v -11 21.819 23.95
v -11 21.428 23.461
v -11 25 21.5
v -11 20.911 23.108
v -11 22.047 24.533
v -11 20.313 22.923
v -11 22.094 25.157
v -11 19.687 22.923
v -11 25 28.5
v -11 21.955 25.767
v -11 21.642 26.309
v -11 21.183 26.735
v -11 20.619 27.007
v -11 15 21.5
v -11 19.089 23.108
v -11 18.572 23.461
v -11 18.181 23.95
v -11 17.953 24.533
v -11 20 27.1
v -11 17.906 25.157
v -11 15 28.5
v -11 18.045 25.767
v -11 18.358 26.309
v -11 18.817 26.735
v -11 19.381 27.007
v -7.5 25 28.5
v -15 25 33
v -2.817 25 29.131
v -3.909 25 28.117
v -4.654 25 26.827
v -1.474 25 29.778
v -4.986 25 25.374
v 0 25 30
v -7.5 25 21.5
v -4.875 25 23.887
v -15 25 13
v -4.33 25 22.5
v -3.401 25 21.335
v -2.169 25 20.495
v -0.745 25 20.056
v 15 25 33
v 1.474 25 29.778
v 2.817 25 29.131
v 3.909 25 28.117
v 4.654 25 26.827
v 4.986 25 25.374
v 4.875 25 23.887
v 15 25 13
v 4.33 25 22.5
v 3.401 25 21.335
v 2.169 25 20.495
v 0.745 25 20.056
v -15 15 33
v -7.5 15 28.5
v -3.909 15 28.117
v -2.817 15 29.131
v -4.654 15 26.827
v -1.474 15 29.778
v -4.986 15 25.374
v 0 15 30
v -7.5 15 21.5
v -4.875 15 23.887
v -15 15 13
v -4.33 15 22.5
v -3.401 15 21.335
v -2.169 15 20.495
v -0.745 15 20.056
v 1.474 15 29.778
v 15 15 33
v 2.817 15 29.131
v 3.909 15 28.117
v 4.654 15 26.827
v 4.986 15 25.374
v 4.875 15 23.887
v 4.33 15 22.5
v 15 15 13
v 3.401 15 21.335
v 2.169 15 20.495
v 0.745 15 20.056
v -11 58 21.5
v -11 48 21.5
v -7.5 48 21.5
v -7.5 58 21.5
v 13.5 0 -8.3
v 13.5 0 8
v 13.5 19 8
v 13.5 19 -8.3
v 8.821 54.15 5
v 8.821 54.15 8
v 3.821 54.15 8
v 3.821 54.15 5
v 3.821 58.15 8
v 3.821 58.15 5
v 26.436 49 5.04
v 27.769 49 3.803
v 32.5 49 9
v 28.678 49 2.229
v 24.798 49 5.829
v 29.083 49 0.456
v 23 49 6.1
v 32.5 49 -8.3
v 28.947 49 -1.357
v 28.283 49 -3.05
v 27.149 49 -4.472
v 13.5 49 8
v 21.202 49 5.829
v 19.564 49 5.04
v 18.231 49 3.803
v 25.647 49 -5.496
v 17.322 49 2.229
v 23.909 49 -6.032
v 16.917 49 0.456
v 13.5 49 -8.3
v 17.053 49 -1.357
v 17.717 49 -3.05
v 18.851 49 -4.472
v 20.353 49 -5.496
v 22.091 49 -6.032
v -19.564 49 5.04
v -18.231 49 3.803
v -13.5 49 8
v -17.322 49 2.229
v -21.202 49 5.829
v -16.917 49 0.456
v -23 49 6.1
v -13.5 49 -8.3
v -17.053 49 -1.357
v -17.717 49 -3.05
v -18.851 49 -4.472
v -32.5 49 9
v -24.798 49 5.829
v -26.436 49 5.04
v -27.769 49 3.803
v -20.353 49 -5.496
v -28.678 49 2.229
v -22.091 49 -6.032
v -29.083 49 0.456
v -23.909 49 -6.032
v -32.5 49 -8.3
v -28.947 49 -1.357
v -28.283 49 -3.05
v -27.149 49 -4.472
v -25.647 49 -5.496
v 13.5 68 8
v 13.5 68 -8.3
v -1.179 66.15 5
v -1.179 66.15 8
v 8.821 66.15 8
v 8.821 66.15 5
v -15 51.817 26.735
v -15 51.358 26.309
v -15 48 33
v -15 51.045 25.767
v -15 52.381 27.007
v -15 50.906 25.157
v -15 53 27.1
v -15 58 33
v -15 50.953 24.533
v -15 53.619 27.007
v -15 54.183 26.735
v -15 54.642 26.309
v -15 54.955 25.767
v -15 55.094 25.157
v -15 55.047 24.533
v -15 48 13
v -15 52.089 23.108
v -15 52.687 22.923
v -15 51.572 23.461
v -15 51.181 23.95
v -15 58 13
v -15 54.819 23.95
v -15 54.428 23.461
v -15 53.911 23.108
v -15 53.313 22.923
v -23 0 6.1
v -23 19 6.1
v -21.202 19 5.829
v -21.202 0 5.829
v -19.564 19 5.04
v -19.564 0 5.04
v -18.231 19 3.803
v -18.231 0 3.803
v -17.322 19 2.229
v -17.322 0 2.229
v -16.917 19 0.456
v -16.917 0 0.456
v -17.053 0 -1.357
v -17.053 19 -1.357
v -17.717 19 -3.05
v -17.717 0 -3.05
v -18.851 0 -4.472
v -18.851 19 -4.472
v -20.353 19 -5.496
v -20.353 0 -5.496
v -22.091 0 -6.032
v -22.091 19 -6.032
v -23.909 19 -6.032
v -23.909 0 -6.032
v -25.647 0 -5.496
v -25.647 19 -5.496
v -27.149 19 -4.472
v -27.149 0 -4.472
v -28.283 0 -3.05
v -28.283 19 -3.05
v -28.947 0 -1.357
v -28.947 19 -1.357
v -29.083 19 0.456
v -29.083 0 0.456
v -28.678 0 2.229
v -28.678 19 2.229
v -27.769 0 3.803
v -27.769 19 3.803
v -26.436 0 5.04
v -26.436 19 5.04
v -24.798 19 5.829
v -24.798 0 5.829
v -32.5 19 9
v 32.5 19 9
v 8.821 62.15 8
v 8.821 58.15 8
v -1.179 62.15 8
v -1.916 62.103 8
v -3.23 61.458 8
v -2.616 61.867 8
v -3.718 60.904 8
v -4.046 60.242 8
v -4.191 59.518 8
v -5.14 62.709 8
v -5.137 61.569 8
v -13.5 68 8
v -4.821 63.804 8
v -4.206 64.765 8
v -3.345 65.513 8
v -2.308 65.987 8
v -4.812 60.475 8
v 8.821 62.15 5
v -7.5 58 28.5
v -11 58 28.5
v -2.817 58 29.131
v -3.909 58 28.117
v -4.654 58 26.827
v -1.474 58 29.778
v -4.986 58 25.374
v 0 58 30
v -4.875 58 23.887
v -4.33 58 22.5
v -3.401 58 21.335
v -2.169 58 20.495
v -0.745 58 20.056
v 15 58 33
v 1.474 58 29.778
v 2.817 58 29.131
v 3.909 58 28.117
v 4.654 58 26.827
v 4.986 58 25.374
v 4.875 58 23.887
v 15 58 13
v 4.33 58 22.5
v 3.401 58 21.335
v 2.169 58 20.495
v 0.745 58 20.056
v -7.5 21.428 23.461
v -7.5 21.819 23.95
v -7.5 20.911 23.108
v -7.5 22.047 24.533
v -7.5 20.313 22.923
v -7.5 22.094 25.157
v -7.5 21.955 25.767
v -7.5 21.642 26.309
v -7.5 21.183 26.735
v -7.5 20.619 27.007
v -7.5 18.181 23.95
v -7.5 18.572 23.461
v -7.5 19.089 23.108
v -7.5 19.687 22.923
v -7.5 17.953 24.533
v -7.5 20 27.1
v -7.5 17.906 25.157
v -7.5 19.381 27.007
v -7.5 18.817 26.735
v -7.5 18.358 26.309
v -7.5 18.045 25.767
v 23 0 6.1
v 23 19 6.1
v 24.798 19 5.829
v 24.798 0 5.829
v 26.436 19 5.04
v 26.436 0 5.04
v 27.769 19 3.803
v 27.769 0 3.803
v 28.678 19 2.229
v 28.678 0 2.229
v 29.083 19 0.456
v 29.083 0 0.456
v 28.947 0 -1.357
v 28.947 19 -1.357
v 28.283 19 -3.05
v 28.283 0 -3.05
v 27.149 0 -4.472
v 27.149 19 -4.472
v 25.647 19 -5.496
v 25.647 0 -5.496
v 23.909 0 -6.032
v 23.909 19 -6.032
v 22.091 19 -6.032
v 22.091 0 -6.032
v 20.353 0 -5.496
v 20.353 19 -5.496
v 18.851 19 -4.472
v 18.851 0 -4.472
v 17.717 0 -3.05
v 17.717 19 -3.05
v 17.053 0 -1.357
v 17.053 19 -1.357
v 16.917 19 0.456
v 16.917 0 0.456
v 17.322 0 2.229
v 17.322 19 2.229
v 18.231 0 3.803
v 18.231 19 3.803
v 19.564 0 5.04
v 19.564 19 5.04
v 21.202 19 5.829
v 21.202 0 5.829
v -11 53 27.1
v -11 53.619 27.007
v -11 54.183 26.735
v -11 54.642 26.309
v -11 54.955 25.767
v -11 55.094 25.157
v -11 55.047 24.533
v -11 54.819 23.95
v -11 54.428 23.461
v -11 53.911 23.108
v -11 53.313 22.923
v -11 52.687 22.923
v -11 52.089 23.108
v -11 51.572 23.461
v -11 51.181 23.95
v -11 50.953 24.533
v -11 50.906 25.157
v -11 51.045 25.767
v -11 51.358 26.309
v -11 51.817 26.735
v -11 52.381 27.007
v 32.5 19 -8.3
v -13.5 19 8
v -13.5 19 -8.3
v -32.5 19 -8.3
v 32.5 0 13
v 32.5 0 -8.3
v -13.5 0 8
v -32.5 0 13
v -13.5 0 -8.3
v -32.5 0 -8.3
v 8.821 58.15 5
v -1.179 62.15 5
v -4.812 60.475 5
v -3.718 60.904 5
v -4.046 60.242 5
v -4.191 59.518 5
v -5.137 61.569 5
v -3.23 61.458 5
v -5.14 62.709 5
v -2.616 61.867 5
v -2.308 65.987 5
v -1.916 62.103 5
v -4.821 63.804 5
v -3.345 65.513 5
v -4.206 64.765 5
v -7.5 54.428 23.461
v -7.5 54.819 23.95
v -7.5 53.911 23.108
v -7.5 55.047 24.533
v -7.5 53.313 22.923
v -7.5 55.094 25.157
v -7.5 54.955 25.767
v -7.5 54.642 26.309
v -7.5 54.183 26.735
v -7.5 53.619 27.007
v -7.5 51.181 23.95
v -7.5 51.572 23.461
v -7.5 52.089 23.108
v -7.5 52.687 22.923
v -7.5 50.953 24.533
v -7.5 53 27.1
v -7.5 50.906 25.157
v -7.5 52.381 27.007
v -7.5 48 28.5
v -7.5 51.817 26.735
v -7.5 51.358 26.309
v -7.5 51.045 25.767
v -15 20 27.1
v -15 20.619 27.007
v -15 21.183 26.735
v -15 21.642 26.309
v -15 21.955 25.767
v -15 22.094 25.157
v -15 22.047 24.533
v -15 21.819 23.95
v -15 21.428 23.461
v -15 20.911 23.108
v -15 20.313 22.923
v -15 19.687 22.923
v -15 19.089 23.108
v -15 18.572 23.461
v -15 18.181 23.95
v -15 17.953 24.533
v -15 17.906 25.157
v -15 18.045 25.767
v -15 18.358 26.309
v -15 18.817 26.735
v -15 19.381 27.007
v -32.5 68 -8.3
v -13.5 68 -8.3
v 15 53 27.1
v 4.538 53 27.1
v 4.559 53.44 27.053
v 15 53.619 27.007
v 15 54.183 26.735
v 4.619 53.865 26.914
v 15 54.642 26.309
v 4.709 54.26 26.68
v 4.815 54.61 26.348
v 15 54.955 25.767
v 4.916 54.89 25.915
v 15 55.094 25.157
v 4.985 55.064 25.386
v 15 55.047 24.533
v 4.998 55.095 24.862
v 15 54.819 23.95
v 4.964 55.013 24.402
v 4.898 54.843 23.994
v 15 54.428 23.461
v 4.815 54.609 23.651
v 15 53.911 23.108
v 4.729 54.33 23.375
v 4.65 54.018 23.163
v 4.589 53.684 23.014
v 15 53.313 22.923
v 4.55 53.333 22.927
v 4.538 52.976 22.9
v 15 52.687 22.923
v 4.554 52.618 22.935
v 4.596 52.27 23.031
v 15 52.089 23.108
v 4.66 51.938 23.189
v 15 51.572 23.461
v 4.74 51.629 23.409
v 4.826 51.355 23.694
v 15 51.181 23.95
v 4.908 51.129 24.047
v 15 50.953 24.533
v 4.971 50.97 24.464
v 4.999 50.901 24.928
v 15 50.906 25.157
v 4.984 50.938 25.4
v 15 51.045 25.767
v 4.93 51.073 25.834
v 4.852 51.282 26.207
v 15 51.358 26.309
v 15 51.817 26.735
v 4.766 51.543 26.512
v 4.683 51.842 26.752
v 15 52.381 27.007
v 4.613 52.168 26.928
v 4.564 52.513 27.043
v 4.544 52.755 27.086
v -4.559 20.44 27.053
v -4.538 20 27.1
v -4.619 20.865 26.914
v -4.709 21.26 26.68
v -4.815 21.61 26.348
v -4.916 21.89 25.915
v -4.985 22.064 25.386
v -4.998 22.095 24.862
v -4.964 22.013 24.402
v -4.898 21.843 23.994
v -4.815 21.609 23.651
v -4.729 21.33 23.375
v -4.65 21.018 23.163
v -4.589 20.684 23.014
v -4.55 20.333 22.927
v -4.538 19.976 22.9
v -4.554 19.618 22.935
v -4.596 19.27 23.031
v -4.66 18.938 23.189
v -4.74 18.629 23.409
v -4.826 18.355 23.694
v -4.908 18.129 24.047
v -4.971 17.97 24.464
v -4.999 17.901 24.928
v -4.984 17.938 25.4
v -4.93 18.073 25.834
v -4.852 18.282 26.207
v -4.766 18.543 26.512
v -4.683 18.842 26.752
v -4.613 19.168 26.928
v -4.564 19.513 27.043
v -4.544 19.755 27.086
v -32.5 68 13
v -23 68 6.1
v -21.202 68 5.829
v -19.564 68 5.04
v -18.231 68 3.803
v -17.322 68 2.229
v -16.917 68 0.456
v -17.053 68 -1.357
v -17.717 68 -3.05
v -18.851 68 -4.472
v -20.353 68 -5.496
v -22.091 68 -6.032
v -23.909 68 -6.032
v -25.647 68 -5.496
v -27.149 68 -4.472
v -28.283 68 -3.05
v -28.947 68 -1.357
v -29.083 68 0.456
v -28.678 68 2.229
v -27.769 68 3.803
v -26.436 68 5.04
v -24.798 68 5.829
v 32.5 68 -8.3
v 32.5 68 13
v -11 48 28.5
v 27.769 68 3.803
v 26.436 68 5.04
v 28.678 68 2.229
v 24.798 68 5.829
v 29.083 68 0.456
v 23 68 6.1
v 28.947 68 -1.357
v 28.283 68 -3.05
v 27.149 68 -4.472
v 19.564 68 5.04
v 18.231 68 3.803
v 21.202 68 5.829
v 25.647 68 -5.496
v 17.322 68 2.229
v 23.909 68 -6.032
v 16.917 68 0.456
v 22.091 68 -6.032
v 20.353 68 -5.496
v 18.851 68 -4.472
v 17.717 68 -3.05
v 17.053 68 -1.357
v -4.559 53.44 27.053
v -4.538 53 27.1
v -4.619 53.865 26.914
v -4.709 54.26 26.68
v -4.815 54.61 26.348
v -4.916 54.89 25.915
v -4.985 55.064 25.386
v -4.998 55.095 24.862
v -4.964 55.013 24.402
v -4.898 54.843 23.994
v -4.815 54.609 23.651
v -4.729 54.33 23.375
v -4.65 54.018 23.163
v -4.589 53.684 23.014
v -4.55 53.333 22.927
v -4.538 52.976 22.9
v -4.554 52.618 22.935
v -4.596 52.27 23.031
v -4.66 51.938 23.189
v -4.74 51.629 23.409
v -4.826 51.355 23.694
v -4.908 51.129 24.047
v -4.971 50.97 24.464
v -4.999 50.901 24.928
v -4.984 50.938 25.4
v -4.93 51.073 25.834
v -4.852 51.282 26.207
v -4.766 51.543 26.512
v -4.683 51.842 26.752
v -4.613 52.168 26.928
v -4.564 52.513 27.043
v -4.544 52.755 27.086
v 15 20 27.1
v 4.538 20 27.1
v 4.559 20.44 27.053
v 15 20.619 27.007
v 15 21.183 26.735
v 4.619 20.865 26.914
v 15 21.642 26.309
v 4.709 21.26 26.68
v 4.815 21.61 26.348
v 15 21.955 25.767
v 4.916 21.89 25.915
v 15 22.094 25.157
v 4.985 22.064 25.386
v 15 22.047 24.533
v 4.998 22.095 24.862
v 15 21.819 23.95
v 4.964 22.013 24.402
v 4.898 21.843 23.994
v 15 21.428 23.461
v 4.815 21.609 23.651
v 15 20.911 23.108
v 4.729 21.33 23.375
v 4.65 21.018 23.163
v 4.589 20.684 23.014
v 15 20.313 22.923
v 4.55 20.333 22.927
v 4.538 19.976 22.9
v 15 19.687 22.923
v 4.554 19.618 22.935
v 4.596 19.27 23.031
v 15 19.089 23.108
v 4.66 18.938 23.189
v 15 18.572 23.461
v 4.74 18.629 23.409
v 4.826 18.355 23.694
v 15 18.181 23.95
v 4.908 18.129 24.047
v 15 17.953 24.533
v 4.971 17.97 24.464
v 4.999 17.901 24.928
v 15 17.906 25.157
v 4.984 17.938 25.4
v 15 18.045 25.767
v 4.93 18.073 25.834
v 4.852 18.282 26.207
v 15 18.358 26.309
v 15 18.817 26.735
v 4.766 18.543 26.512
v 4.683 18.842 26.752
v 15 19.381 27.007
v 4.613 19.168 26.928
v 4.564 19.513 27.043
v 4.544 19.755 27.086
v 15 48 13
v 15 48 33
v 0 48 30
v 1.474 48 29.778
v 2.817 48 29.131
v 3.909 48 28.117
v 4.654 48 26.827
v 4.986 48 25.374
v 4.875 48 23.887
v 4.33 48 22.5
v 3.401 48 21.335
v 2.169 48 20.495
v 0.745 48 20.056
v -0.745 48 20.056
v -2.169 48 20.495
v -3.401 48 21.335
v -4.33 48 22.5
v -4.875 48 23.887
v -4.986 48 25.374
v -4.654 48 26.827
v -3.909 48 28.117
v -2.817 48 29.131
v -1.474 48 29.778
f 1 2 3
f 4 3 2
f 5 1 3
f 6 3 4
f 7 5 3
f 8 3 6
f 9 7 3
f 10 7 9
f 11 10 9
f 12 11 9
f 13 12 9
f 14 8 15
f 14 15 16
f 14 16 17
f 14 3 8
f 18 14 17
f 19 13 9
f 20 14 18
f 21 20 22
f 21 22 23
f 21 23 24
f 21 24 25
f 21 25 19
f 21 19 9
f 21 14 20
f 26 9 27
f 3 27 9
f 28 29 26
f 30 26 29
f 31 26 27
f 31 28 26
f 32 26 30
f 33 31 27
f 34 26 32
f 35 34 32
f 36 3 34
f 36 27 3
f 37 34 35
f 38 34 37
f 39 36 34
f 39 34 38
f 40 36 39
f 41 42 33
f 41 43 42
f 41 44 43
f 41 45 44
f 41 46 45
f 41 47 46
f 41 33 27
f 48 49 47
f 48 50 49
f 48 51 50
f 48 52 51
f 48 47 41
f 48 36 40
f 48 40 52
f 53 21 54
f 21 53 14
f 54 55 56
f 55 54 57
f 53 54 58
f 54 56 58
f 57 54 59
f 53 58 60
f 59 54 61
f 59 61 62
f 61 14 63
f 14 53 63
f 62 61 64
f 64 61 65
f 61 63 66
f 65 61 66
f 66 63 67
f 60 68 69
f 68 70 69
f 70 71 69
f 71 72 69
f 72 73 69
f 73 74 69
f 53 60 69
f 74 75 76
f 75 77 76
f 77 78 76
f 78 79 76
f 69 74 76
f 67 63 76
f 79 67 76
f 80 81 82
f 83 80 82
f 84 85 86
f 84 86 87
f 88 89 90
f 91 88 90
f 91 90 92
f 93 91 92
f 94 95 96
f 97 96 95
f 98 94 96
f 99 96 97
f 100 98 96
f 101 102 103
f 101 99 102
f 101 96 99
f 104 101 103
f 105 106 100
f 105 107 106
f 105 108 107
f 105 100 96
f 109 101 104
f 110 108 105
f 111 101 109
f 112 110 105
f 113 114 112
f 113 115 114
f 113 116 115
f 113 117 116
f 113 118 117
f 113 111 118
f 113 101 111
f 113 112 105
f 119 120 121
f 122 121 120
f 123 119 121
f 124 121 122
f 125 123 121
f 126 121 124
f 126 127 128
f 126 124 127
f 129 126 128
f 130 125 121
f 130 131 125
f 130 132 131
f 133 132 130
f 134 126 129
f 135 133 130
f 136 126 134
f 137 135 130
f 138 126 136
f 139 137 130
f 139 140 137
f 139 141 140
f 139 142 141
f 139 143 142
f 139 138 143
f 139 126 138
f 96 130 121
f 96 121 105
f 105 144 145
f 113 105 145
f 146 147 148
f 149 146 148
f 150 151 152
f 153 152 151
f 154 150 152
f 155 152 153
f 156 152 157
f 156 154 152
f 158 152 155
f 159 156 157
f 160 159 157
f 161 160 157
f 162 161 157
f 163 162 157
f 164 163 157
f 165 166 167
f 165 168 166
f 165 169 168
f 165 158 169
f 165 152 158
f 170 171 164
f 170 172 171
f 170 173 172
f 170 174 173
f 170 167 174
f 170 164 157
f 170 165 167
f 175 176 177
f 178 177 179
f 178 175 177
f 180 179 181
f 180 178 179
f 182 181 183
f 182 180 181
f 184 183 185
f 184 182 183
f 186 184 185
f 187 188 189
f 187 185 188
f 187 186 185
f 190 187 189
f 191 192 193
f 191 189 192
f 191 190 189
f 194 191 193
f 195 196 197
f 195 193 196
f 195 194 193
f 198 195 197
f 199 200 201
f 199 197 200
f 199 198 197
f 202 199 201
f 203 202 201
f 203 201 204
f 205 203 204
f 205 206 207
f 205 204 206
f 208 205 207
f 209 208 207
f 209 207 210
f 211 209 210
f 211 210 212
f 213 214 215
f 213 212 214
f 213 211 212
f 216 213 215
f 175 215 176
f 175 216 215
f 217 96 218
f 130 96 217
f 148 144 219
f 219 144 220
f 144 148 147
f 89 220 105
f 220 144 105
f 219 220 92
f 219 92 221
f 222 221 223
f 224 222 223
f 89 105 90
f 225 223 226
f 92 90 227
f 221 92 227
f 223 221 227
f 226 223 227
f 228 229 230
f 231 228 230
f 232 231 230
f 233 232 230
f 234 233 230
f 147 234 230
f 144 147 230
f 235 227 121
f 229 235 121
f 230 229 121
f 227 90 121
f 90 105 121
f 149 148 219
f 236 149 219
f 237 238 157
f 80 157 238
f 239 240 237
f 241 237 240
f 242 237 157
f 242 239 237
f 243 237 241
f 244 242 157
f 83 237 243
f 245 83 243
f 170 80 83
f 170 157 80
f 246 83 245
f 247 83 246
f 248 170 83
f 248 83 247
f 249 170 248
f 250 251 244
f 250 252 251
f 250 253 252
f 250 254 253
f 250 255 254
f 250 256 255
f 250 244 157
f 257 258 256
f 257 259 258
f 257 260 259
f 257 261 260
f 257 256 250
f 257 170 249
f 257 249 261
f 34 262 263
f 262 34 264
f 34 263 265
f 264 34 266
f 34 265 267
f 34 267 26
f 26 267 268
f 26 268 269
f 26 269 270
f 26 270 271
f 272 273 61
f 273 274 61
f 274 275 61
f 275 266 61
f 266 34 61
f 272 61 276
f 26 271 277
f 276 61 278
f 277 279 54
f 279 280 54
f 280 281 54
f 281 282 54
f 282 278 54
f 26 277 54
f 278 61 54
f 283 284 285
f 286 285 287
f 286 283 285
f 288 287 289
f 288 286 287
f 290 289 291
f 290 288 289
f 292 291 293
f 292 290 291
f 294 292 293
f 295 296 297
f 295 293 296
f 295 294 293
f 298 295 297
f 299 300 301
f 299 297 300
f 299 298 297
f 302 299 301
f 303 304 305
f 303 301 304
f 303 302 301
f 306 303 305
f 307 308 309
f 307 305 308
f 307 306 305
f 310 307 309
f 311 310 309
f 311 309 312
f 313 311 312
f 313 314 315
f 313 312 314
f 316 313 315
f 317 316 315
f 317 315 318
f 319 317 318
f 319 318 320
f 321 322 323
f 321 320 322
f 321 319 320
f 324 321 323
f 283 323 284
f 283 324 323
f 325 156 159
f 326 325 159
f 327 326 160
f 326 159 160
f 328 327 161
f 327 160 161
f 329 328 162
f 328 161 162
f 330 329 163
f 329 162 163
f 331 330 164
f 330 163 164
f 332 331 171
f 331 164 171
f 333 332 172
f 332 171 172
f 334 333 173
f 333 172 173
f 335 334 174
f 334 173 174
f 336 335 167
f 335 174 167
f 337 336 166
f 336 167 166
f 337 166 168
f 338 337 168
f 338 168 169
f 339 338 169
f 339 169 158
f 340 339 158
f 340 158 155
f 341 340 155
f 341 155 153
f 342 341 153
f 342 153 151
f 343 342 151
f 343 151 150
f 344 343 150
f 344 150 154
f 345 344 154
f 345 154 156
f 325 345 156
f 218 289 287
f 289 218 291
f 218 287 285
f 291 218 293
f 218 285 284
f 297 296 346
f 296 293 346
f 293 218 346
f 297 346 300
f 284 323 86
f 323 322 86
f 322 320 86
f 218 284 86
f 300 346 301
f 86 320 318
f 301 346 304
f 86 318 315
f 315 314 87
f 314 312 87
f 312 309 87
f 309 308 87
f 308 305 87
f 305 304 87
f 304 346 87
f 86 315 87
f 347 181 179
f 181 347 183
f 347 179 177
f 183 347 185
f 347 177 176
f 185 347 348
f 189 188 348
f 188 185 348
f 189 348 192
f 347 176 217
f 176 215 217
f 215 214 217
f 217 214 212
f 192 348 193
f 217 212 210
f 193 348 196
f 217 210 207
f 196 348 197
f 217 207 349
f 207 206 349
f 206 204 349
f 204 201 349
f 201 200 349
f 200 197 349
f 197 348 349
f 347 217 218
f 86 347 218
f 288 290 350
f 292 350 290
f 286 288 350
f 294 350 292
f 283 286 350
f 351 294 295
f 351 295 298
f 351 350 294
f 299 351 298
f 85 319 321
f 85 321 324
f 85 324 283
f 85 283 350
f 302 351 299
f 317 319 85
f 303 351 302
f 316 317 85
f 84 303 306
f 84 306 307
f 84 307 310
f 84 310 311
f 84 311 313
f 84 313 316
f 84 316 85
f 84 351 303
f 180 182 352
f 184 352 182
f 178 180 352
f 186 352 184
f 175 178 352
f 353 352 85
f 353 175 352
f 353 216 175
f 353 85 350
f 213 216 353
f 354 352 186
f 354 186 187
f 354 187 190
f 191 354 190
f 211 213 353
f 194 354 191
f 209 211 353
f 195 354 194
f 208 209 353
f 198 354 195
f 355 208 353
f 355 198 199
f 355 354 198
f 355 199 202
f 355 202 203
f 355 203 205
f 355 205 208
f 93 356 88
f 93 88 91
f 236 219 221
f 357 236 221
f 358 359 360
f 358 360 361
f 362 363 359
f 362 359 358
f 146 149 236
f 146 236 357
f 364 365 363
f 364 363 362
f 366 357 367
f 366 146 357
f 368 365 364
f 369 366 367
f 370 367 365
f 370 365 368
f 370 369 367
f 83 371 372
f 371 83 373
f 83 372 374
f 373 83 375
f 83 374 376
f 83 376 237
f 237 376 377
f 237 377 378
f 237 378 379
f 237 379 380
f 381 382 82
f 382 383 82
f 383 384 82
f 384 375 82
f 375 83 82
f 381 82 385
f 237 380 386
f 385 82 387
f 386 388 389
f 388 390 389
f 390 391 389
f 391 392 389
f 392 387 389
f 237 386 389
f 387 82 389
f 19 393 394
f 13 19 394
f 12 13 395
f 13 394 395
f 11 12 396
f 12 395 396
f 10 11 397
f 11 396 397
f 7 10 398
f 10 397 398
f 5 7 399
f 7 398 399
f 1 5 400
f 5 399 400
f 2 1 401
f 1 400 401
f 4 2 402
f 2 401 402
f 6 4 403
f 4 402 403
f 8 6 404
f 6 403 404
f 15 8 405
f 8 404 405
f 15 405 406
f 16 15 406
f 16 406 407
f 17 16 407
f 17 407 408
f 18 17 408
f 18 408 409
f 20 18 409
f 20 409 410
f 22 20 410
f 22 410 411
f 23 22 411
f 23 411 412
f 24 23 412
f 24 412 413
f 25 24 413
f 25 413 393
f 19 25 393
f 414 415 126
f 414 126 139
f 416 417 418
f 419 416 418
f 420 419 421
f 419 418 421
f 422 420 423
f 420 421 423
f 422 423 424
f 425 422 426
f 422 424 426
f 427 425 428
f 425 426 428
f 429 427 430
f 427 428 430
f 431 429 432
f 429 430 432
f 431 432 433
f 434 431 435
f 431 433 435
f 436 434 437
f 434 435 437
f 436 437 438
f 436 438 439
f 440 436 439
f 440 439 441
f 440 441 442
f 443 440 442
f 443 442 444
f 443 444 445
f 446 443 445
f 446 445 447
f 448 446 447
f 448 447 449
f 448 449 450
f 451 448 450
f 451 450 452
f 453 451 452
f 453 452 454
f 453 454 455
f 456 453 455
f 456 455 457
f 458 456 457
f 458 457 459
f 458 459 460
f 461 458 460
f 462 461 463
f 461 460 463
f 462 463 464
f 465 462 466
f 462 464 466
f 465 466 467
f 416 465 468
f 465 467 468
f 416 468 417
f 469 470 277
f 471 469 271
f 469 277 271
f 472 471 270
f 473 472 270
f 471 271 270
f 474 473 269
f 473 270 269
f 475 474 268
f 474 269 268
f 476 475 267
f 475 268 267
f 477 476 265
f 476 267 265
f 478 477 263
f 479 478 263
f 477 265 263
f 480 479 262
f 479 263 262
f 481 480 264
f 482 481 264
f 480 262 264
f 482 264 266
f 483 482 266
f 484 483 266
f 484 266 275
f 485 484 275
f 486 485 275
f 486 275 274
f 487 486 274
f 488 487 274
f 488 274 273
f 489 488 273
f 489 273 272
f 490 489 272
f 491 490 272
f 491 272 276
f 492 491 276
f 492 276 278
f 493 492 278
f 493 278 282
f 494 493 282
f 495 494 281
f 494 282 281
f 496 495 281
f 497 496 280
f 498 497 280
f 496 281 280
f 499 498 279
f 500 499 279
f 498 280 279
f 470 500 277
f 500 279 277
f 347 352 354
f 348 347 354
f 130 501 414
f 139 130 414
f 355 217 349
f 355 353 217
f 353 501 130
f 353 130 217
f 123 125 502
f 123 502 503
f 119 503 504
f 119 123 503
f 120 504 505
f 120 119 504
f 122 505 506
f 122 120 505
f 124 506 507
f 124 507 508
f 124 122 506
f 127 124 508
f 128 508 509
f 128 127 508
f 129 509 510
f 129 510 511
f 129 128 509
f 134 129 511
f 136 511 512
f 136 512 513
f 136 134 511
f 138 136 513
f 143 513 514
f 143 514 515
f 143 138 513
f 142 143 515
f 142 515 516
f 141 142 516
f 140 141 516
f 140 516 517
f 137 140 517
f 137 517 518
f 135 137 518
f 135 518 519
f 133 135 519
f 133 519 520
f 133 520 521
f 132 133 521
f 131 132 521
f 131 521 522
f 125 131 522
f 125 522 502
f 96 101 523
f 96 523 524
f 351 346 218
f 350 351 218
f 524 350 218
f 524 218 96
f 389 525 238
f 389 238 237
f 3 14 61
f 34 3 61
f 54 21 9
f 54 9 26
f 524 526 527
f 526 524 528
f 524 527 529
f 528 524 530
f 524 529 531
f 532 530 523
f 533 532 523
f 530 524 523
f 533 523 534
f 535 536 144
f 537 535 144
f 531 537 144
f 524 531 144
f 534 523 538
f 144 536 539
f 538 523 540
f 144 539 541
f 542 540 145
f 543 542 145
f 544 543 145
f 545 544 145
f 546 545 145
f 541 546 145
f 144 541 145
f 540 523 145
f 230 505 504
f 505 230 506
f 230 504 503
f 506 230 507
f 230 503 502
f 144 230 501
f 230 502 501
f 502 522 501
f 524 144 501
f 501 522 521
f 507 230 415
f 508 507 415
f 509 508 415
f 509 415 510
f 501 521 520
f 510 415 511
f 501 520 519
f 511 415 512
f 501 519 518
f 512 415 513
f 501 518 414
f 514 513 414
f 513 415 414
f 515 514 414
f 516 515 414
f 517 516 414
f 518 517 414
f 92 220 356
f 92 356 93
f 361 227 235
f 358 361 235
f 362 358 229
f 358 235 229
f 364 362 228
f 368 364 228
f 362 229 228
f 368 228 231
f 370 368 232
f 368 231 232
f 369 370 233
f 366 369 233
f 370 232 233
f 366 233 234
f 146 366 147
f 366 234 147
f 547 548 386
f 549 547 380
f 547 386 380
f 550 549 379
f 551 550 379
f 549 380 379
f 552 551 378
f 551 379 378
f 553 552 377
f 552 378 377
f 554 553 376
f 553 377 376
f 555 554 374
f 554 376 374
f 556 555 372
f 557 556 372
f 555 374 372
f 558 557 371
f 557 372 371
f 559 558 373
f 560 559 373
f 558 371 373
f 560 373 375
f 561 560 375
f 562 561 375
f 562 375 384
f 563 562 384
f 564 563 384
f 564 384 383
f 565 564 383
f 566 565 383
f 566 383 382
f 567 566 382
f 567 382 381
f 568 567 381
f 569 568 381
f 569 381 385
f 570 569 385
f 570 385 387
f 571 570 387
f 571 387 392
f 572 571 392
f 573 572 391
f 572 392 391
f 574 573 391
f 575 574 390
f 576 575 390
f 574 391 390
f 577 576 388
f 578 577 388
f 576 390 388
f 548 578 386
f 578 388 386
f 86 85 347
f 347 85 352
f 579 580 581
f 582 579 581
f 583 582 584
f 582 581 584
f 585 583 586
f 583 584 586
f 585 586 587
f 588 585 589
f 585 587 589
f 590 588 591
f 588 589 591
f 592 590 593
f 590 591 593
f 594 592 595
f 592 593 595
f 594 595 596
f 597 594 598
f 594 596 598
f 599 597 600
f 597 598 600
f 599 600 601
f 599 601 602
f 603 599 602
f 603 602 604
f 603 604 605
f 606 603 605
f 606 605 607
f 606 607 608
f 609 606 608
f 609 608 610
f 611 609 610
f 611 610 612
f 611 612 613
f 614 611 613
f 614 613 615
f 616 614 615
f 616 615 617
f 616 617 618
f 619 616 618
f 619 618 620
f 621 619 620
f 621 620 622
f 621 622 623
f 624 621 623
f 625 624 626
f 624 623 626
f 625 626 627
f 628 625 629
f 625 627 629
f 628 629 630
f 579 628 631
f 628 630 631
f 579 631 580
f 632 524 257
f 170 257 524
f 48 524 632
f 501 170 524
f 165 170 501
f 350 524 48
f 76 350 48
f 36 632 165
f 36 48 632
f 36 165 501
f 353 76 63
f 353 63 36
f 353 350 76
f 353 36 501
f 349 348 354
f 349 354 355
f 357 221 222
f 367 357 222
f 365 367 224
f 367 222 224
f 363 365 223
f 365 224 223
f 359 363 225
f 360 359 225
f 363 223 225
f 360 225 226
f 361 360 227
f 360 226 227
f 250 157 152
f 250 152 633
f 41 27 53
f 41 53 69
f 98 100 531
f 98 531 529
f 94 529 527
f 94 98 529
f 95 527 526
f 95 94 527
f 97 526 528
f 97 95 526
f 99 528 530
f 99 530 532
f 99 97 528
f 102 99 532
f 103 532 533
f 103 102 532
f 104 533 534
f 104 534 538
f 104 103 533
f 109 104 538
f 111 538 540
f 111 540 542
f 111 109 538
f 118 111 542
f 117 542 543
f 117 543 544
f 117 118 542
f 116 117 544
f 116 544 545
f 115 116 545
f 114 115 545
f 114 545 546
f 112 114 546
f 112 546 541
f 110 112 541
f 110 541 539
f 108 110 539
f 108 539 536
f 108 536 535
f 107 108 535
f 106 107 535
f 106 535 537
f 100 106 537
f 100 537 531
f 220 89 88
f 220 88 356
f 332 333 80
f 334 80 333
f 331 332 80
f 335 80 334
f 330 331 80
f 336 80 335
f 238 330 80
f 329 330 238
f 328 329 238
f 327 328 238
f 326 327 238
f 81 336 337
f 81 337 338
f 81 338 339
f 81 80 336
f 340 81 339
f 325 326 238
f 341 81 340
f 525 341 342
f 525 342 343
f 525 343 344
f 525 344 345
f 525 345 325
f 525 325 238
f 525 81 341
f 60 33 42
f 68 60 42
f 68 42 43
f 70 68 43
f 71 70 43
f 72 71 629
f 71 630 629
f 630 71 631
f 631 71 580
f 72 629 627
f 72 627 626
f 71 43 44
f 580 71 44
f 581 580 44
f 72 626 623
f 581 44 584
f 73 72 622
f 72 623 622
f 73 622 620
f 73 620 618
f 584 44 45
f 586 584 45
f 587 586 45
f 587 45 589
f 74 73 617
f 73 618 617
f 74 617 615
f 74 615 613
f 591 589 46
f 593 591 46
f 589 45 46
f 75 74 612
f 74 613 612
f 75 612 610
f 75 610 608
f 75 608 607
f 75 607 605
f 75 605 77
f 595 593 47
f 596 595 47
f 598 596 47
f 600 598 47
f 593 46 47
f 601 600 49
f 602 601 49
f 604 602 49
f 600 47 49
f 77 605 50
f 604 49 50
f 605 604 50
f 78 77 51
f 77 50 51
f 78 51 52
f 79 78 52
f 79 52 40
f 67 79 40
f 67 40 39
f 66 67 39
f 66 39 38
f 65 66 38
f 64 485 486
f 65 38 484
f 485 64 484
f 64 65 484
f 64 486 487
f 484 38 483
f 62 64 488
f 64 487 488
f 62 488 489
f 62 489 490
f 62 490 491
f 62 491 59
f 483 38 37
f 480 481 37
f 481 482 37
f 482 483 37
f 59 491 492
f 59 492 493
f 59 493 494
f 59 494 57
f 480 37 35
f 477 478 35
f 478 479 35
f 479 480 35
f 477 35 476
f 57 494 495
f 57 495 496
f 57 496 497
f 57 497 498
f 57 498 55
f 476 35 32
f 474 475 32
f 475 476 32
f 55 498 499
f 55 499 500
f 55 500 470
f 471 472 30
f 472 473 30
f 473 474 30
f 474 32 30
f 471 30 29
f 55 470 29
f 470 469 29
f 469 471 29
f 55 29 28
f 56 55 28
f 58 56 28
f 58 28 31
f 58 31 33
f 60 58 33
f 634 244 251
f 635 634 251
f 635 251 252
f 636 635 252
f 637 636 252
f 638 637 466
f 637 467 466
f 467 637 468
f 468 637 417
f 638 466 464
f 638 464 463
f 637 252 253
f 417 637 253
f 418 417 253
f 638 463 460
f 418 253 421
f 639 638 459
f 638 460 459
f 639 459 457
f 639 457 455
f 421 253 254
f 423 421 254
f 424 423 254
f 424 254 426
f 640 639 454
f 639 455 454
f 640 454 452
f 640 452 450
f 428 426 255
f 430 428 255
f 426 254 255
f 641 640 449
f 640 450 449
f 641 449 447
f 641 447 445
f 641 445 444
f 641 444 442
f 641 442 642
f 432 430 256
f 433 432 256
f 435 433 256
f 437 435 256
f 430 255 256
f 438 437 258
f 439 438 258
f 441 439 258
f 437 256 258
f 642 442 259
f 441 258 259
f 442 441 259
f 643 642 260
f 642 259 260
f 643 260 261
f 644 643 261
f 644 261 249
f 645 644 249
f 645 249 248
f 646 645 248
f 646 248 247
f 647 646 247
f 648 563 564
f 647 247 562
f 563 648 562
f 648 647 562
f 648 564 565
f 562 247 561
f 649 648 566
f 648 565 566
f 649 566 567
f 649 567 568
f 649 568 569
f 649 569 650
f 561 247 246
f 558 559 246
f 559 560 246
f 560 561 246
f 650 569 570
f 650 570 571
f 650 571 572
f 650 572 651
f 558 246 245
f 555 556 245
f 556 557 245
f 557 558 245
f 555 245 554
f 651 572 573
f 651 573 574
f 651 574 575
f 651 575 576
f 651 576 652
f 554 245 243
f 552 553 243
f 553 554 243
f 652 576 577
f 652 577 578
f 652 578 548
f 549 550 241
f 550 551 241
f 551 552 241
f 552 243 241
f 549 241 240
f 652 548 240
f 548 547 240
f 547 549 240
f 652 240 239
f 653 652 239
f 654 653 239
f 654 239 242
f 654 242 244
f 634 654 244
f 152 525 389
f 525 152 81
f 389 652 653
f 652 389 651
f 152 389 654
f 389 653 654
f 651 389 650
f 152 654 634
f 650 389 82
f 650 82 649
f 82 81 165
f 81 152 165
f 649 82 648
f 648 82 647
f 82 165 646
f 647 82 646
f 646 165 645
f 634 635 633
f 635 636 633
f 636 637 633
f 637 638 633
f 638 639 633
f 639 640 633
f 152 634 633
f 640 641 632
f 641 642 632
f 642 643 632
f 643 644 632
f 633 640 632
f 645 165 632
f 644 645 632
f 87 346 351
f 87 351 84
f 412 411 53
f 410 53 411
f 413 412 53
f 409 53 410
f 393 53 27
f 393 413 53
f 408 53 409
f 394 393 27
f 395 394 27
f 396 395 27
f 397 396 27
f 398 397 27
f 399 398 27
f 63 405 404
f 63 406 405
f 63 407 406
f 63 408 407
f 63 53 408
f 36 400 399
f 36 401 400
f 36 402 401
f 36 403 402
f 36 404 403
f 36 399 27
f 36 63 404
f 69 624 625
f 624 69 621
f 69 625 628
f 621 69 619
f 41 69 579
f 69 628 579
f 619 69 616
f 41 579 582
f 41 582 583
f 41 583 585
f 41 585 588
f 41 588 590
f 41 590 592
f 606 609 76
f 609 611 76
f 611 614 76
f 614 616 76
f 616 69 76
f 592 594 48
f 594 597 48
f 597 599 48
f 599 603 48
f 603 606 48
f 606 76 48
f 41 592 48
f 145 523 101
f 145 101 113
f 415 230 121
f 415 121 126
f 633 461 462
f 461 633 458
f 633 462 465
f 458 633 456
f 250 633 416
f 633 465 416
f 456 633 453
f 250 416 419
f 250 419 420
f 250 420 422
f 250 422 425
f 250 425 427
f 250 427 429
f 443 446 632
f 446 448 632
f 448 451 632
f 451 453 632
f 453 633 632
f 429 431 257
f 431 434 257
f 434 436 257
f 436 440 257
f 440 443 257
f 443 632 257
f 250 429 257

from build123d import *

# Parameters (mm, degrees)
SKETCH1_W           = 19
SKETCH1_H           = 17
SKETCH1_R           = 6.1
BOSS_EXTRUDE1_DEPTH = 68
CUT_EXTRUDE1_REACH  = 80.513
SKETCH3_W           = 65
SKETCH3_H           = 30
SKETCH4_W           = 5
SKETCH4_H           = 4
BOSS_EXTRUDE2_DEPTH = 3
SKETCH5_W           = 30
SKETCH5_H           = 10
BOSS_EXTRUDE3_DEPTH = 20
SKETCH6_R           = 5
CUT_EXTRUDE2_DEPTH  = 75.224322159
SKETCH8_R           = 2.1
CUT_EXTRUDE3_DEPTH  = 90.270655873
CUT_EXTRUDE4_REACH  = 72.386
SKETCH9_W           = 3.5
SKETCH9_H           = 3.5
SKETCH10_W          = 19
SKETCH10_H          = 19
CUT_EXTRUDE5_DEPTH  = 0.7
SKETCH11_W          = 65
SKETCH11_H          = 30
CUT_EXTRUDE6_DEPTH  = 1


with BuildPart() as part:
    # Sketch1 → Boss-Extrude1 (new body)
    # profile 1 of 3: a face of its own
    with BuildSketch(Plane(origin=(0, 0, 0), x_dir=(1, 0, 0), z_dir=(0, 1, 0))):
        with Locations((-23, 0.5)):
            Rectangle(SKETCH1_W, SKETCH1_H)
        with Locations(Location((-23, 0, 0), (0, 0, 270))):
            Circle(SKETCH1_R, mode=Mode.SUBTRACT)
    # profile 2 of 3: a face of its own
    with BuildSketch(Plane(origin=(0, 0, 0), x_dir=(1, 0, 0), z_dir=(0, 1, 0))):
        with Locations((23, 0.5)):
            Rectangle(SKETCH1_W, SKETCH1_H)
        with Locations(Location((23, 0, 0), (0, 0, 270))):
            Circle(SKETCH1_R, mode=Mode.SUBTRACT)
    # profile 3 of 3: a face of its own
    with BuildSketch(Plane(origin=(0, 0, 0), x_dir=(1, 0, 0), z_dir=(0, 1, 0))):
        Polygon((-13.5, -8), (13.5, -8), (32.5, -8), (32.5, -13), (-32.5, -13), (-32.5, -8), align=None)
    extrude(amount=BOSS_EXTRUDE1_DEPTH)

    # Cut-Extrude1: up to this face of the body (flat: up to its plane)
    cut_extrude1_end = Plane(part.part.faces().sort_by_distance((0, 34, 8))[0])
    # Sketch3 → Cut-Extrude1 (cut, up to the picked face)
    with BuildSketch(Plane(origin=(0, 0, -9), x_dir=(-1, 0, 0), z_dir=(0, 0, -1)), mode=Mode.PRIVATE) as cut_extrude1_sk1:
        with Locations((0, 34)):
            Rectangle(SKETCH3_W, SKETCH3_H)
    cut_extrude1_tool1 = split(extrude(cut_extrude1_sk1.sketch, amount=-CUT_EXTRUDE1_REACH, mode=Mode.PRIVATE), bisect_by=cut_extrude1_end, keep=Keep.BOTH, mode=Mode.PRIVATE)
    add(cut_extrude1_tool1.solids().sort_by(Axis((0, 34, -9), (0, 0, 1)))[0], mode=Mode.SUBTRACT)

    # Sketch4 → Boss-Extrude2 (add)
    with BuildSketch(Plane(origin=(0, 0, 8), x_dir=(-1, 0, 0), z_dir=(0, 0, -1))):
        with BuildLine():
            ThreePointArc((4.191236083, 59.518146972), (4.82097308, 63.804174702), (1.17903595, 66.15))
            Line((1.17903595, 66.15), (-8.82096405, 66.15))
            Line((-8.82096405, 66.15), (-8.82096405, 62.15))
            Line((-8.82096405, 62.15), (1.17903595, 62.15))
            ThreePointArc((1.17903595, 62.15), (3.230210626, 61.45792056), (4.191236083, 59.518146972))
        make_face()
        with Locations((-6.32096405, 56.15)):
            Rectangle(SKETCH4_W, SKETCH4_H)
    extrude(amount=BOSS_EXTRUDE2_DEPTH)

    # Sketch5 → Boss-Extrude3 (add)
    with BuildSketch(Plane.XY.offset(13)):
        with Locations((0, 20)):
            Rectangle(SKETCH5_W, SKETCH5_H)
        with Locations((0, 53)):
            Rectangle(SKETCH5_W, SKETCH5_H)
    extrude(amount=BOSS_EXTRUDE3_DEPTH)

    # Sketch6 → Cut-Extrude2 (cut, through all)
    with BuildSketch(Plane(origin=(0, 58, 0), x_dir=(1, 0, 0), z_dir=(0, 1, 0))):
        with Locations(Location((0, -25, 0), (0, 0, 270))):
            Circle(SKETCH6_R)
    extrude(amount=-CUT_EXTRUDE2_DEPTH, mode=Mode.SUBTRACT)

    # Sketch8 → Cut-Extrude3 (cut, through all)
    with BuildSketch(Plane.ZY.offset(15)):
        with Locations((25, 20)):
            Circle(SKETCH8_R)
        with Locations((25, 53)):
            Circle(SKETCH8_R)
    extrude(amount=-CUT_EXTRUDE3_DEPTH, mode=Mode.SUBTRACT)

    # Cut-Extrude4: up to this face of the body (flat: up to its plane)
    cut_extrude4_end = Plane(part.part.faces().sort_by_distance((14.639444872, 58, 23))[0])
    # Sketch9 → Cut-Extrude4 (cut, up to the picked face)
    with BuildSketch(Plane.XZ.offset(-15), mode=Mode.PRIVATE) as cut_extrude4_sk1:
        with Locations((-9.25, 23.25)):
            Rectangle(SKETCH9_W, SKETCH9_H)
    cut_extrude4_tool1 = split(extrude(cut_extrude4_sk1.sketch, amount=-CUT_EXTRUDE4_REACH, mode=Mode.PRIVATE), bisect_by=cut_extrude4_end, keep=Keep.BOTH, mode=Mode.PRIVATE)
    # Sketch9 → Cut-Extrude4 (cut, up to the picked face)
    with BuildSketch(Plane.XZ.offset(-15), mode=Mode.PRIVATE) as cut_extrude4_sk2:
        with Locations((-9.25, 26.75)):
            Rectangle(SKETCH9_W, SKETCH9_H)
    cut_extrude4_tool2 = split(extrude(cut_extrude4_sk2.sketch, amount=-CUT_EXTRUDE4_REACH, mode=Mode.PRIVATE), bisect_by=cut_extrude4_end, keep=Keep.BOTH, mode=Mode.PRIVATE)
    add(cut_extrude4_tool1.solids().sort_by(Axis((-9.25, 15, 23.25), (0, 1, 0)))[0], mode=Mode.SUBTRACT)
    add(cut_extrude4_tool2.solids().sort_by(Axis((-9.25, 15, 26.75), (0, 1, 0)))[0], mode=Mode.SUBTRACT)

    # Sketch10 → Cut-Extrude5 (cut)
    with BuildSketch(Plane(origin=(0, 0, -9), x_dir=(-1, 0, 0), z_dir=(0, 0, -1))):
        with Locations((23, 9.5)):
            Rectangle(SKETCH10_W, SKETCH10_H)
        with Locations((-23, 9.5)):
            Rectangle(SKETCH10_W, SKETCH10_H)
        with Locations((23, 58.5)):
            Rectangle(SKETCH10_W, SKETCH10_H)
        with Locations((-23, 58.5)):
            Rectangle(SKETCH10_W, SKETCH10_H)
    extrude(amount=-CUT_EXTRUDE5_DEPTH, mode=Mode.SUBTRACT)

    # Sketch11 → Cut-Extrude6 (cut)
    with BuildSketch(Plane(origin=(0, 0, 8), x_dir=(-1, 0, 0), z_dir=(0, 0, -1))):
        with Locations((0, 34)):
            Rectangle(SKETCH11_W, SKETCH11_H)
    extrude(amount=-CUT_EXTRUDE6_DEPTH, mode=Mode.SUBTRACT)


solid = part.part
